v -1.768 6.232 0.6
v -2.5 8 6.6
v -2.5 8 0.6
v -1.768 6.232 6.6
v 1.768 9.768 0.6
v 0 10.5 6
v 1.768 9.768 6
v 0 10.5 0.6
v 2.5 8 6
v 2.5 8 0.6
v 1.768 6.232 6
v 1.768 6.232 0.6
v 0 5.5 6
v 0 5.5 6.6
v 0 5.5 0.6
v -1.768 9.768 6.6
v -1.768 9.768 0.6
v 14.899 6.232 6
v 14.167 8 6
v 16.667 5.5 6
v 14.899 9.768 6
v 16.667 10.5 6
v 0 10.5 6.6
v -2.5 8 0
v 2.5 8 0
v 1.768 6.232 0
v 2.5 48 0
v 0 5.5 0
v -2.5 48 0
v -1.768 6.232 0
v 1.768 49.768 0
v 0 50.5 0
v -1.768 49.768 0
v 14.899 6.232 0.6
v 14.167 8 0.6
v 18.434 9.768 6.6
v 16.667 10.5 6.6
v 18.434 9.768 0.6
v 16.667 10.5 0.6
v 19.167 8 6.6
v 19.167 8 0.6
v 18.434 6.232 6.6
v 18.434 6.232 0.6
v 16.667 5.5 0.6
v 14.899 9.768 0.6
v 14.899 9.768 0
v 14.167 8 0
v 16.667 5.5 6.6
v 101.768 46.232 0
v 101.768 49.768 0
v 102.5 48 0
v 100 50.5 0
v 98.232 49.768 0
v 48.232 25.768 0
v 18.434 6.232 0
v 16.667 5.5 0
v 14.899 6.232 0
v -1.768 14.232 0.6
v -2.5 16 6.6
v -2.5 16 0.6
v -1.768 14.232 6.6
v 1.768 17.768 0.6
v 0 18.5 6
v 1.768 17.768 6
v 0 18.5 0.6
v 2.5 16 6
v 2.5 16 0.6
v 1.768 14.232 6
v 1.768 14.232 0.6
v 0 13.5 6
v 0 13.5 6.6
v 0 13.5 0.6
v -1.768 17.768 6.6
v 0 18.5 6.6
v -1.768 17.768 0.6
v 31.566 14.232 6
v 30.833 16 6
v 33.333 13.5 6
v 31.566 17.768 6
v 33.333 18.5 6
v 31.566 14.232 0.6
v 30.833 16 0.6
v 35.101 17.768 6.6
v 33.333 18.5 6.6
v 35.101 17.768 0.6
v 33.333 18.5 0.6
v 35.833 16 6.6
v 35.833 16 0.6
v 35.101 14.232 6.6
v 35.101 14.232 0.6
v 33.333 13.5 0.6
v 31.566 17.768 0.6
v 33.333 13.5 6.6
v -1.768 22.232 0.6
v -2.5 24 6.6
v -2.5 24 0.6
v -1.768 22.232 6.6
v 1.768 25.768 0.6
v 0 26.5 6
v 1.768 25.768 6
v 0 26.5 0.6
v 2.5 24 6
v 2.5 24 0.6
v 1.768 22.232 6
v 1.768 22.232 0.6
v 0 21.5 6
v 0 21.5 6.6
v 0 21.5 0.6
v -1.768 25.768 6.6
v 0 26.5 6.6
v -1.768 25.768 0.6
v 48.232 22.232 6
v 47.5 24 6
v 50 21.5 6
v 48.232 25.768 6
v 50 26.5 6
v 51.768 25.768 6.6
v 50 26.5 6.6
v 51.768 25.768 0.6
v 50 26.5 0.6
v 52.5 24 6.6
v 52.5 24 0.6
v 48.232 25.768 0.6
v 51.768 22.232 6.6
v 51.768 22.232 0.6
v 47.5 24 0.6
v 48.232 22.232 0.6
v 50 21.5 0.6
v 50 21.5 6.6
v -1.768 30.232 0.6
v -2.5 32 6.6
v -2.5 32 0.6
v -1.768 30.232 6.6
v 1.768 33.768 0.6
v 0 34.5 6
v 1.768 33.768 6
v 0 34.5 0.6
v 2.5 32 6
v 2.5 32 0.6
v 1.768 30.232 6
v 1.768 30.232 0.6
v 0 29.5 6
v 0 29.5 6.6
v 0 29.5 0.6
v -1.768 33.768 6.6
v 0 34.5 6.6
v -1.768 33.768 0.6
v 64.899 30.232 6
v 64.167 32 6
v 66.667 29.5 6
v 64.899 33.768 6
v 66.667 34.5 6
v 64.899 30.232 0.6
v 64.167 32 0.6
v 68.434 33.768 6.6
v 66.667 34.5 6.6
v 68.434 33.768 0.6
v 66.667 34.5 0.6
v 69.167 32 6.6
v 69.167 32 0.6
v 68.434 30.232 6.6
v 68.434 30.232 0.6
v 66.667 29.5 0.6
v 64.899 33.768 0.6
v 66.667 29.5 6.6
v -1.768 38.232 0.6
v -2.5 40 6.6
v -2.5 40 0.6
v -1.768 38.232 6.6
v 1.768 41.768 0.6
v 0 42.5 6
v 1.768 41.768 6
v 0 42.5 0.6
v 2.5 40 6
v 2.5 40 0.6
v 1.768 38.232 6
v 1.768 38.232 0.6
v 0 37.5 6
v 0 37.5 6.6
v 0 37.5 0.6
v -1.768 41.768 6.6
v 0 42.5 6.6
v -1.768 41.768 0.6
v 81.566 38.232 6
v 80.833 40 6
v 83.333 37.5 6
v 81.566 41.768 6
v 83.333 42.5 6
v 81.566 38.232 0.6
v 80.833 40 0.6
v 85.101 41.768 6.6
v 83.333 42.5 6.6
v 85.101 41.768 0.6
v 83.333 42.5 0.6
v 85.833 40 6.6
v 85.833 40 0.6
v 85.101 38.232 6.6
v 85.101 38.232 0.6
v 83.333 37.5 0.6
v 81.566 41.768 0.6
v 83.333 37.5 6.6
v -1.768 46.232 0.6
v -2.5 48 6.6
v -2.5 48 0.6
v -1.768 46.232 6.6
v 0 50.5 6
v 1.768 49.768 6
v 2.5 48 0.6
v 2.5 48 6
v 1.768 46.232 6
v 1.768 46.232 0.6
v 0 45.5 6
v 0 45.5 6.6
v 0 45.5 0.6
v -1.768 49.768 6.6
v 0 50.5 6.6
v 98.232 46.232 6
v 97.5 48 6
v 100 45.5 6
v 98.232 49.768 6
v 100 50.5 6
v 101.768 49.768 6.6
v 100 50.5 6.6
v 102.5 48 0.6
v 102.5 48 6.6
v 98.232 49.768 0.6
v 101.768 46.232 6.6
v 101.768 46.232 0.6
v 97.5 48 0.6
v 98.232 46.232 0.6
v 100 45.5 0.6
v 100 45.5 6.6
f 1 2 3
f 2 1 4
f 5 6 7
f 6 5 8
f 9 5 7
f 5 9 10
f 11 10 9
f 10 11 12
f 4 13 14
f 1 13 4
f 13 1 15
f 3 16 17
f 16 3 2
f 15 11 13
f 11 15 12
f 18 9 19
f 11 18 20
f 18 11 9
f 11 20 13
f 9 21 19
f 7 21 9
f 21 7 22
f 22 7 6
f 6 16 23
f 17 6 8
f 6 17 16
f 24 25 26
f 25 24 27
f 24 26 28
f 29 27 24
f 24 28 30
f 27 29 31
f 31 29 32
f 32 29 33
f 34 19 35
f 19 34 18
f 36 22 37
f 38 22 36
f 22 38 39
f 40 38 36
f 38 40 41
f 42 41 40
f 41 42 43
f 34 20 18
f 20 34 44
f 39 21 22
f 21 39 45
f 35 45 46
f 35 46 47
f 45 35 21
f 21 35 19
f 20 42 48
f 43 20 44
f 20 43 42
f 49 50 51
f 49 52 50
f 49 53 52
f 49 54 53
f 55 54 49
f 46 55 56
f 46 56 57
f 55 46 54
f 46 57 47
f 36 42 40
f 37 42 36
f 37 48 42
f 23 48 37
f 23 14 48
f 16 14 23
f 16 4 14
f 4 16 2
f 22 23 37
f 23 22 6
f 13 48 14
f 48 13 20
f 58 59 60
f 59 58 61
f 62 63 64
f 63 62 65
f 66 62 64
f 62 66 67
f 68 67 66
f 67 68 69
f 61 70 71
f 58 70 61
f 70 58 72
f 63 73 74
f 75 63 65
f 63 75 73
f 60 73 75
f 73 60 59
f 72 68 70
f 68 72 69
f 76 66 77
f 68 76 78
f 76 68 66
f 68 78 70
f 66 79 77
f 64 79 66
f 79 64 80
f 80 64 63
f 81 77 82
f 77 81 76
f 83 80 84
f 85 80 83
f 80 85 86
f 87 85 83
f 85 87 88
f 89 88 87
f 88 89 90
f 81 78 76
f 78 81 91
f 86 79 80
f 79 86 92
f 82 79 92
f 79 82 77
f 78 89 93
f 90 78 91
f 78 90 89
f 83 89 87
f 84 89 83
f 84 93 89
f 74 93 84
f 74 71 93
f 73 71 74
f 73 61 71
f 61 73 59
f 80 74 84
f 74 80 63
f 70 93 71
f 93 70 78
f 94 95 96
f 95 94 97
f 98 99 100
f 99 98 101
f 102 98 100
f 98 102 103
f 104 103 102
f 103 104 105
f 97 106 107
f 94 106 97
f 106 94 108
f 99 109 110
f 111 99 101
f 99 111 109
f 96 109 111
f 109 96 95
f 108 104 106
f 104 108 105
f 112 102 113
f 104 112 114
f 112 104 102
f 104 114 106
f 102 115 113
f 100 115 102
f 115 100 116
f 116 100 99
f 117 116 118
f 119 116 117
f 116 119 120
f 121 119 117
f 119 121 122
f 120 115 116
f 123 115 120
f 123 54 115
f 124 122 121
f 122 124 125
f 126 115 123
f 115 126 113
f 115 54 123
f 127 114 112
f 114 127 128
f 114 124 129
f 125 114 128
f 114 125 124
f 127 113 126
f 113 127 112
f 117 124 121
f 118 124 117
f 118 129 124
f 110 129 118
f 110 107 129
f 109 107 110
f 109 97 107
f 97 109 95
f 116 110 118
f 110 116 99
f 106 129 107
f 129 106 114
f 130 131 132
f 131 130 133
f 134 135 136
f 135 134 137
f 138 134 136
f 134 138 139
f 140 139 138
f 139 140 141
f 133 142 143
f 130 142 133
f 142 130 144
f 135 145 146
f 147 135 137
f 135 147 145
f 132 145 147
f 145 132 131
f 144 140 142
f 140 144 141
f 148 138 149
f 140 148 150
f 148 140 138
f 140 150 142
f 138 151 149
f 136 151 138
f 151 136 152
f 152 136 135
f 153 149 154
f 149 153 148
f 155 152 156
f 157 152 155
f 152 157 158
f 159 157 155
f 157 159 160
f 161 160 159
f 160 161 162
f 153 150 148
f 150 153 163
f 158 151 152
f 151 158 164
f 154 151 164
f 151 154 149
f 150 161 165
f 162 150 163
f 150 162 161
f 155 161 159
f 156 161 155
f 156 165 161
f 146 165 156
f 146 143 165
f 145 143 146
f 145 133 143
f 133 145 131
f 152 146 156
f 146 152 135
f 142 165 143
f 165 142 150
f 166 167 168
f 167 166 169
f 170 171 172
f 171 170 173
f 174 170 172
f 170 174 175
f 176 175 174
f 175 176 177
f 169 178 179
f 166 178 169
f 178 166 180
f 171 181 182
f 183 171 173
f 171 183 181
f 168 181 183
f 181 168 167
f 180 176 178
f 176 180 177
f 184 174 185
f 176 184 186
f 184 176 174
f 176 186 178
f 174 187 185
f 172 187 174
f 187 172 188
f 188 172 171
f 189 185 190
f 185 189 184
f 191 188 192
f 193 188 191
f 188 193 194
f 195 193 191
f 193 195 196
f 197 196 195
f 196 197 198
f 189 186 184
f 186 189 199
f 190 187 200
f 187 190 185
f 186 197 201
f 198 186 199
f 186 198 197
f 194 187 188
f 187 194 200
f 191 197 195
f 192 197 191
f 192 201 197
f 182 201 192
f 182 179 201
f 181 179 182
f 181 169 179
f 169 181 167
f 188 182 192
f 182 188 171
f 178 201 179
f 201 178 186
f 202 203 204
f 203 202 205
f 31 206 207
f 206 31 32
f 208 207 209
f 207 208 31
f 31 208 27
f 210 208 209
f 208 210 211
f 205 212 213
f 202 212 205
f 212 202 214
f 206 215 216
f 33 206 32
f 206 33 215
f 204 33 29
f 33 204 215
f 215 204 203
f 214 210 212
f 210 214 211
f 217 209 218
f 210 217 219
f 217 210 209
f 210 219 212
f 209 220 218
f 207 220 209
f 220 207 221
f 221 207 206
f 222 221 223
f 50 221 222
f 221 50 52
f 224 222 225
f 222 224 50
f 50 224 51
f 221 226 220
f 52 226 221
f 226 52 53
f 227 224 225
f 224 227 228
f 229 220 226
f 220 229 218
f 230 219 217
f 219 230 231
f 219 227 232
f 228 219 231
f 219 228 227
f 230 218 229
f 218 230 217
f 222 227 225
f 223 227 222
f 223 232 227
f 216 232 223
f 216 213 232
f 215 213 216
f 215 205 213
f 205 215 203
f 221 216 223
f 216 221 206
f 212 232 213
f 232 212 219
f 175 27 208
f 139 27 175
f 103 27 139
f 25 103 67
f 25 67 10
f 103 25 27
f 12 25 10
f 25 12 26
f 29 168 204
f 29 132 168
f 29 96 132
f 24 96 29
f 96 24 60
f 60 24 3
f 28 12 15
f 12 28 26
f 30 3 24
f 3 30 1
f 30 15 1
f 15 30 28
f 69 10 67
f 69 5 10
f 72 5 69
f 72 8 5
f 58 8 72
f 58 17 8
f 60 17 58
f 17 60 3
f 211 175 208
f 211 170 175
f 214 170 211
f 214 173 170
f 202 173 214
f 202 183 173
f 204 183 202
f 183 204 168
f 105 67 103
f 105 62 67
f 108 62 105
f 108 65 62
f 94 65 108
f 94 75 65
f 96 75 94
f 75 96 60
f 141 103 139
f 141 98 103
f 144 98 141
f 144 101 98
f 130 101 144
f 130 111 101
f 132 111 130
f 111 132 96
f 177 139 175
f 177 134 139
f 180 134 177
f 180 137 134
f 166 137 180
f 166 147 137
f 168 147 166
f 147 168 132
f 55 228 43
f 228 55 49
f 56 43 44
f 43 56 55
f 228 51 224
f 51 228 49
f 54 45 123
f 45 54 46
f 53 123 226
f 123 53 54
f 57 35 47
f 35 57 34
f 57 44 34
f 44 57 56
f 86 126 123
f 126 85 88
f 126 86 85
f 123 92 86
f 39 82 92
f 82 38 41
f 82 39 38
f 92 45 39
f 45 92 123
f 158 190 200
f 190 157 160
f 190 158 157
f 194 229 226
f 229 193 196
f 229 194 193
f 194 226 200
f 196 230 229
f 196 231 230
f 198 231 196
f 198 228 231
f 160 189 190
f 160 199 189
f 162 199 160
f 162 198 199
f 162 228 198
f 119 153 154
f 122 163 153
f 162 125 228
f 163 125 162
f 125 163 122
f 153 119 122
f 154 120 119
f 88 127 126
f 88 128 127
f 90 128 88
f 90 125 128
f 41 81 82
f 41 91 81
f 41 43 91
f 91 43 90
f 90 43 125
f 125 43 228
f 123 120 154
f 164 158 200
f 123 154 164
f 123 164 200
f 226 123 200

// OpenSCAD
// simple parametric bridge test
//Longest span
x= 100;
// Number of spans
n=6;
// Height of towers
ht=6;
// Diameter of towers
d1=5;
// Thickness of bridge
th=.6;
// Base yes/no [0/1]
base=1;

for (i=[1:n]) {
    translate([0,i*(d1+3),0]) bridge(i*x/n);
    }

if (base){
    hull() {
    translate([0,d1+3,0]) cylinder(d=d1,h=th);
    translate([0,n*(d1+3),0]) cylinder(d=d1,h=th);
    }

    hull() {
    translate([x/n,d1+3,0]) cylinder(d=d1,h=th);
    translate([x,n*(d1+3),0]) cylinder(d=d1,h=th);
    }
}

module bridge(l) {
    cylinder(d=d1,h=ht);
    translate([l,0,0]) cylinder(d=d1,h=ht);
    hull() {
    translate([0,0,ht]) cylinder(d=d1,h=th);
    translate([l,0,ht]) cylinder(d=d1,h=th);
    }
}
